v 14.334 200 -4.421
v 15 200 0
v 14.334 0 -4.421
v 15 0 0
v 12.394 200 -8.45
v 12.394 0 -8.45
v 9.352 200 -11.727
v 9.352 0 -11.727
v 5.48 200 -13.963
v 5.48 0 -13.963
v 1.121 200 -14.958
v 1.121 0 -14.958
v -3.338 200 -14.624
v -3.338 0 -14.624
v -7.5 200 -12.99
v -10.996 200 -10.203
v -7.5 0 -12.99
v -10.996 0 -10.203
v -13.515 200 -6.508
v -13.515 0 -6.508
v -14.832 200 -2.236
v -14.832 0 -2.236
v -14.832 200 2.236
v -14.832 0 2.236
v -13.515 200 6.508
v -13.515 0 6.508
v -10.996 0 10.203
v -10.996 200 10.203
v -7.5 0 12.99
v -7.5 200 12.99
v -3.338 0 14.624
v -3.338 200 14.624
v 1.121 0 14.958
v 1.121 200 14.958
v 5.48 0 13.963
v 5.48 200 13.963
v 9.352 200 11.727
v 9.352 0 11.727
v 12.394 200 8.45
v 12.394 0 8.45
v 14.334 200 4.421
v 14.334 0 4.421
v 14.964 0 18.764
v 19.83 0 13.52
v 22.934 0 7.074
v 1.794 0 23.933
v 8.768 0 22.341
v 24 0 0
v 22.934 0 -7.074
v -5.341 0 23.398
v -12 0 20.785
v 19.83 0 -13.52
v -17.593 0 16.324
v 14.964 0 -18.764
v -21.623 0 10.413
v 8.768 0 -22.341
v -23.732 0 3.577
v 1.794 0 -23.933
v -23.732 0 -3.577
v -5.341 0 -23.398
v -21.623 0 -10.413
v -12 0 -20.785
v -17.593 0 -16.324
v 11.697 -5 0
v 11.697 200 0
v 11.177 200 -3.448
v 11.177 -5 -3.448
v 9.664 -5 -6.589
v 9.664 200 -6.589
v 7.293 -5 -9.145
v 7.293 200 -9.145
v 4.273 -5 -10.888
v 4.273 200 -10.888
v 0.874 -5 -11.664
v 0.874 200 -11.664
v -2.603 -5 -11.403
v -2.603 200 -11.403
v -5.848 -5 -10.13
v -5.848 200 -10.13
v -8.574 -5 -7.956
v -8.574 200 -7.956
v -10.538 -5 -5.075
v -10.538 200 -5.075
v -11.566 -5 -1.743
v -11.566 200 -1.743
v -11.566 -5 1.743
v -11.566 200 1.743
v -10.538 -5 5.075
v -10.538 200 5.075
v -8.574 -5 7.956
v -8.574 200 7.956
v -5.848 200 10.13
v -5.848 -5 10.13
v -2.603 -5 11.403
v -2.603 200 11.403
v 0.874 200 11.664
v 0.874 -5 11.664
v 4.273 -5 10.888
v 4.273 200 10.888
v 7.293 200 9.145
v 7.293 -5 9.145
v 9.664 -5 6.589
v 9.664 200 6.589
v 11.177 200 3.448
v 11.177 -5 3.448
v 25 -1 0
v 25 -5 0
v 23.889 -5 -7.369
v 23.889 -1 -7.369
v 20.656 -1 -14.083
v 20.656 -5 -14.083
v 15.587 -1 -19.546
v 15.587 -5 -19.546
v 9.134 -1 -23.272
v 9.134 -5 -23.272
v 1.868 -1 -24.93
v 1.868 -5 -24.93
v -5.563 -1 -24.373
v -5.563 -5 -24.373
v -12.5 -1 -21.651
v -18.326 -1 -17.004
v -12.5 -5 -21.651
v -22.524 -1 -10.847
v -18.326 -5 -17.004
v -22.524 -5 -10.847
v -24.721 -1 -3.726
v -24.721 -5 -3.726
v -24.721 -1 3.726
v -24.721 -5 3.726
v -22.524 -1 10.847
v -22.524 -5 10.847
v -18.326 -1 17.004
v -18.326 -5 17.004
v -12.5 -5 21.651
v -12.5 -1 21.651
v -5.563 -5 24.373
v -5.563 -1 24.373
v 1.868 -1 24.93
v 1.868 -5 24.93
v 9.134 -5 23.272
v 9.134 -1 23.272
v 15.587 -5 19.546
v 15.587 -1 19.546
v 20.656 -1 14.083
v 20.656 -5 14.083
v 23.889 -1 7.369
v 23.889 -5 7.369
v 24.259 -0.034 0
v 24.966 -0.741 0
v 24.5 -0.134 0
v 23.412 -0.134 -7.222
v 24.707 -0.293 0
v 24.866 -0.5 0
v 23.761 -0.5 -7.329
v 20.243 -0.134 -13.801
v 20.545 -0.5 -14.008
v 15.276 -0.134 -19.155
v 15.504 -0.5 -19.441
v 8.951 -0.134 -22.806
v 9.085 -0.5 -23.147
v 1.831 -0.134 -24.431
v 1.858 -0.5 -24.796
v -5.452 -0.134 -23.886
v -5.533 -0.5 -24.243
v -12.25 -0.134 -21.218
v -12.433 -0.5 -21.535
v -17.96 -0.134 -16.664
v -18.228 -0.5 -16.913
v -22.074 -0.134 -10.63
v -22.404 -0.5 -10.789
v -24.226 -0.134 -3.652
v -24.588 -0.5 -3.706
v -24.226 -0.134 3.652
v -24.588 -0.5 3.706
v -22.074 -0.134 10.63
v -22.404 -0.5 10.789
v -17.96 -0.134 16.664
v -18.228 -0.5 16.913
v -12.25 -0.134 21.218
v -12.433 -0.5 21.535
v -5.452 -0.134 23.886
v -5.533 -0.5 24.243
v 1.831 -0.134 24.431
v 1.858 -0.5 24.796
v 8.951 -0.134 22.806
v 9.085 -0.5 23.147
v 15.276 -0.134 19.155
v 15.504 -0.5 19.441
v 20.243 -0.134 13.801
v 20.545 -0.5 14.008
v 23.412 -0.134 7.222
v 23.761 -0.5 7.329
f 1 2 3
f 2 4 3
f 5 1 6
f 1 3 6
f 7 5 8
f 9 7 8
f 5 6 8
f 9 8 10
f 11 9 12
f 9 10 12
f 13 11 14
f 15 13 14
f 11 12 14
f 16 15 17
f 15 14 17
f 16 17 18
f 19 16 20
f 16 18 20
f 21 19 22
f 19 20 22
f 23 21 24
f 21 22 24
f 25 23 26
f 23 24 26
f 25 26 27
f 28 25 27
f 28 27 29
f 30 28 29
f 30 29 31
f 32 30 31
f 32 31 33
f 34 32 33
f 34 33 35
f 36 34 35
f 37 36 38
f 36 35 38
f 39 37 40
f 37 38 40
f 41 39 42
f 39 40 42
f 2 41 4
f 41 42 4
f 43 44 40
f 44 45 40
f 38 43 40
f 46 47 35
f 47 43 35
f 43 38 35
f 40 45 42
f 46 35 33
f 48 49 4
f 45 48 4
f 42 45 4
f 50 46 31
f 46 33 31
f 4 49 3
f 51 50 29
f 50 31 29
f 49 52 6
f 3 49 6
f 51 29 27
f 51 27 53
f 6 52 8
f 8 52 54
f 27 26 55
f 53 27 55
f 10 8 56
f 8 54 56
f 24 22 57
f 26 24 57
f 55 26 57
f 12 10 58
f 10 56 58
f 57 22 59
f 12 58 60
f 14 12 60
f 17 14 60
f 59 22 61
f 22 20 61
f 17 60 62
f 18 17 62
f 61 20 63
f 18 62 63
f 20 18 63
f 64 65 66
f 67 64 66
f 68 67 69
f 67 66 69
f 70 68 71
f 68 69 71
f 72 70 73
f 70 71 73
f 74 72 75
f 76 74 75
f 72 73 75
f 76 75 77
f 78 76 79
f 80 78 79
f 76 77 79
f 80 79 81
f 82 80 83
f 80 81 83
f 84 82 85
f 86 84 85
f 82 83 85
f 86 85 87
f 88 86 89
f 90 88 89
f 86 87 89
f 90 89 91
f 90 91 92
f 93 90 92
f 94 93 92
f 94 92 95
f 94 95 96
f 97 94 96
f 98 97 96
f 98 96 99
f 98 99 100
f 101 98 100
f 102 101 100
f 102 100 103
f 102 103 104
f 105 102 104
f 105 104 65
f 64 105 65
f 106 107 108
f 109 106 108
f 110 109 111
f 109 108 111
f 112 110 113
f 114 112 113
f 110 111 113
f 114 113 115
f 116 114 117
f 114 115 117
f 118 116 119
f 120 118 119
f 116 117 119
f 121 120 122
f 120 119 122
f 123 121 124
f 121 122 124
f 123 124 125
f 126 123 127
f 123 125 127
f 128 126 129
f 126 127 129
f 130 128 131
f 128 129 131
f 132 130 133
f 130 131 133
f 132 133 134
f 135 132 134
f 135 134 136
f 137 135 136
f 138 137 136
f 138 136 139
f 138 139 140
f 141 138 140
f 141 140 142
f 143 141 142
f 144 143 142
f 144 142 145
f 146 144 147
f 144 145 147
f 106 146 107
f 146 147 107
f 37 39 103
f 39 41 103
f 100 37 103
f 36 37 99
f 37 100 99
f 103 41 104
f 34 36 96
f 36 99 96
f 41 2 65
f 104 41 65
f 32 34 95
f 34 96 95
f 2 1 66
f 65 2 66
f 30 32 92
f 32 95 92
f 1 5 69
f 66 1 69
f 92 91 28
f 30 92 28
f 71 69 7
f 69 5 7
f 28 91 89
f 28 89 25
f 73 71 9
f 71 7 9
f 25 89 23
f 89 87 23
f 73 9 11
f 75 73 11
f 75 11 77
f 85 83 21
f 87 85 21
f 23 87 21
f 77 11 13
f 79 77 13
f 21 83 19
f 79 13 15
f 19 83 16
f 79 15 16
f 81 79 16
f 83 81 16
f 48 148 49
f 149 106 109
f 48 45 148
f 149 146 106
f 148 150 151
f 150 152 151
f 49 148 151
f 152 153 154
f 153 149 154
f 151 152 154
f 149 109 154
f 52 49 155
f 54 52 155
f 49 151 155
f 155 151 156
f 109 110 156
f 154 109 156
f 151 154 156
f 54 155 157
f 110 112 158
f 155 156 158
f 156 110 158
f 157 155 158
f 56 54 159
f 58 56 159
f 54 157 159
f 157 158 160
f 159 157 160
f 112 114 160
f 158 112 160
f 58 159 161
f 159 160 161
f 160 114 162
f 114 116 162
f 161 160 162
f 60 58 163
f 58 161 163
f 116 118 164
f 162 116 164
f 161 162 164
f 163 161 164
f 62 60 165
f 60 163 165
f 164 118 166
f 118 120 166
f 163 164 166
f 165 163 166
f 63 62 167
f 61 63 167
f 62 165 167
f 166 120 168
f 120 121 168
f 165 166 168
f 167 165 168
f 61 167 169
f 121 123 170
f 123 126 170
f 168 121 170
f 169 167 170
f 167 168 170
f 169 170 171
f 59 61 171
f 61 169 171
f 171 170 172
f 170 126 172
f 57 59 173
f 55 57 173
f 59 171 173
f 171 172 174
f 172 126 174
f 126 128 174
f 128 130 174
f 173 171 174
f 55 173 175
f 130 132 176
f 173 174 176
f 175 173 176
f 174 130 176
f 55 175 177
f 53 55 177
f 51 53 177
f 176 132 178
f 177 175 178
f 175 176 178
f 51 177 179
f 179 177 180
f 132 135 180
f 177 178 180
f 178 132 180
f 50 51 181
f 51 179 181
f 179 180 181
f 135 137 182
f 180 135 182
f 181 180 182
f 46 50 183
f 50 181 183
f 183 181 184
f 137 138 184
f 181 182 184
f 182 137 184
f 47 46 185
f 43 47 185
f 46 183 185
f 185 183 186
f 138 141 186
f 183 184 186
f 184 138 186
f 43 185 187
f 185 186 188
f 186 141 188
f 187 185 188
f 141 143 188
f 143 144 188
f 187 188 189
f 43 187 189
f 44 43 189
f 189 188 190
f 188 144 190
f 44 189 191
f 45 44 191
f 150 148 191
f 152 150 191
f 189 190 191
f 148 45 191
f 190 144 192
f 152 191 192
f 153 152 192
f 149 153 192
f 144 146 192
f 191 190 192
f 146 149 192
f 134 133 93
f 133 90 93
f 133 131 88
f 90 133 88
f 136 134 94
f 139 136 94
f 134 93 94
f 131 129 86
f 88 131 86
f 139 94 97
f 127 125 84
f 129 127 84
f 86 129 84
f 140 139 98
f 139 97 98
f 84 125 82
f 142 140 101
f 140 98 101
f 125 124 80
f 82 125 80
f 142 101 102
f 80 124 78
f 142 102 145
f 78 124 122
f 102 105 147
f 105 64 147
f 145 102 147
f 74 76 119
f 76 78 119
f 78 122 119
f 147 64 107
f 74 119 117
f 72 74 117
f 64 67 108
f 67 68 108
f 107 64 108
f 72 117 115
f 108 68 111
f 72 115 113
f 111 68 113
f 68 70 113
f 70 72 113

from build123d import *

# Parameters (mm, degrees)
FILLET2_R          = 1
SKETCH2_R          = 11.696559432
CUT_EXTRUDE1_DEPTH = 206


with BuildPart() as part:
    # Sketch1 → Revolve1 (revolve)
    with BuildSketch(Plane.XY):
        Polygon((0, 0), (0, 200), (15, 200), (15, 0), (25, 0), (25, -5), (0, -5), align=None)
    revolve(axis=Axis((0, 0, 0), (0, 1, 0)))

    # Fillet2
    fillet2_edges = [part.edges().sort_by_distance(p)[0] for p in [
        (-25, 0, 0),
    ]]
    fillet(fillet2_edges, radius=FILLET2_R)

    # Sketch2 → Cut-Extrude1 (cut, through all)
    with BuildSketch(Plane(origin=(0, 200, 0), x_dir=(1, 0, 0), z_dir=(0, 1, 0))):
        Circle(SKETCH2_R)
    extrude(amount=-CUT_EXTRUDE1_DEPTH, mode=Mode.SUBTRACT)


solid = part.part
